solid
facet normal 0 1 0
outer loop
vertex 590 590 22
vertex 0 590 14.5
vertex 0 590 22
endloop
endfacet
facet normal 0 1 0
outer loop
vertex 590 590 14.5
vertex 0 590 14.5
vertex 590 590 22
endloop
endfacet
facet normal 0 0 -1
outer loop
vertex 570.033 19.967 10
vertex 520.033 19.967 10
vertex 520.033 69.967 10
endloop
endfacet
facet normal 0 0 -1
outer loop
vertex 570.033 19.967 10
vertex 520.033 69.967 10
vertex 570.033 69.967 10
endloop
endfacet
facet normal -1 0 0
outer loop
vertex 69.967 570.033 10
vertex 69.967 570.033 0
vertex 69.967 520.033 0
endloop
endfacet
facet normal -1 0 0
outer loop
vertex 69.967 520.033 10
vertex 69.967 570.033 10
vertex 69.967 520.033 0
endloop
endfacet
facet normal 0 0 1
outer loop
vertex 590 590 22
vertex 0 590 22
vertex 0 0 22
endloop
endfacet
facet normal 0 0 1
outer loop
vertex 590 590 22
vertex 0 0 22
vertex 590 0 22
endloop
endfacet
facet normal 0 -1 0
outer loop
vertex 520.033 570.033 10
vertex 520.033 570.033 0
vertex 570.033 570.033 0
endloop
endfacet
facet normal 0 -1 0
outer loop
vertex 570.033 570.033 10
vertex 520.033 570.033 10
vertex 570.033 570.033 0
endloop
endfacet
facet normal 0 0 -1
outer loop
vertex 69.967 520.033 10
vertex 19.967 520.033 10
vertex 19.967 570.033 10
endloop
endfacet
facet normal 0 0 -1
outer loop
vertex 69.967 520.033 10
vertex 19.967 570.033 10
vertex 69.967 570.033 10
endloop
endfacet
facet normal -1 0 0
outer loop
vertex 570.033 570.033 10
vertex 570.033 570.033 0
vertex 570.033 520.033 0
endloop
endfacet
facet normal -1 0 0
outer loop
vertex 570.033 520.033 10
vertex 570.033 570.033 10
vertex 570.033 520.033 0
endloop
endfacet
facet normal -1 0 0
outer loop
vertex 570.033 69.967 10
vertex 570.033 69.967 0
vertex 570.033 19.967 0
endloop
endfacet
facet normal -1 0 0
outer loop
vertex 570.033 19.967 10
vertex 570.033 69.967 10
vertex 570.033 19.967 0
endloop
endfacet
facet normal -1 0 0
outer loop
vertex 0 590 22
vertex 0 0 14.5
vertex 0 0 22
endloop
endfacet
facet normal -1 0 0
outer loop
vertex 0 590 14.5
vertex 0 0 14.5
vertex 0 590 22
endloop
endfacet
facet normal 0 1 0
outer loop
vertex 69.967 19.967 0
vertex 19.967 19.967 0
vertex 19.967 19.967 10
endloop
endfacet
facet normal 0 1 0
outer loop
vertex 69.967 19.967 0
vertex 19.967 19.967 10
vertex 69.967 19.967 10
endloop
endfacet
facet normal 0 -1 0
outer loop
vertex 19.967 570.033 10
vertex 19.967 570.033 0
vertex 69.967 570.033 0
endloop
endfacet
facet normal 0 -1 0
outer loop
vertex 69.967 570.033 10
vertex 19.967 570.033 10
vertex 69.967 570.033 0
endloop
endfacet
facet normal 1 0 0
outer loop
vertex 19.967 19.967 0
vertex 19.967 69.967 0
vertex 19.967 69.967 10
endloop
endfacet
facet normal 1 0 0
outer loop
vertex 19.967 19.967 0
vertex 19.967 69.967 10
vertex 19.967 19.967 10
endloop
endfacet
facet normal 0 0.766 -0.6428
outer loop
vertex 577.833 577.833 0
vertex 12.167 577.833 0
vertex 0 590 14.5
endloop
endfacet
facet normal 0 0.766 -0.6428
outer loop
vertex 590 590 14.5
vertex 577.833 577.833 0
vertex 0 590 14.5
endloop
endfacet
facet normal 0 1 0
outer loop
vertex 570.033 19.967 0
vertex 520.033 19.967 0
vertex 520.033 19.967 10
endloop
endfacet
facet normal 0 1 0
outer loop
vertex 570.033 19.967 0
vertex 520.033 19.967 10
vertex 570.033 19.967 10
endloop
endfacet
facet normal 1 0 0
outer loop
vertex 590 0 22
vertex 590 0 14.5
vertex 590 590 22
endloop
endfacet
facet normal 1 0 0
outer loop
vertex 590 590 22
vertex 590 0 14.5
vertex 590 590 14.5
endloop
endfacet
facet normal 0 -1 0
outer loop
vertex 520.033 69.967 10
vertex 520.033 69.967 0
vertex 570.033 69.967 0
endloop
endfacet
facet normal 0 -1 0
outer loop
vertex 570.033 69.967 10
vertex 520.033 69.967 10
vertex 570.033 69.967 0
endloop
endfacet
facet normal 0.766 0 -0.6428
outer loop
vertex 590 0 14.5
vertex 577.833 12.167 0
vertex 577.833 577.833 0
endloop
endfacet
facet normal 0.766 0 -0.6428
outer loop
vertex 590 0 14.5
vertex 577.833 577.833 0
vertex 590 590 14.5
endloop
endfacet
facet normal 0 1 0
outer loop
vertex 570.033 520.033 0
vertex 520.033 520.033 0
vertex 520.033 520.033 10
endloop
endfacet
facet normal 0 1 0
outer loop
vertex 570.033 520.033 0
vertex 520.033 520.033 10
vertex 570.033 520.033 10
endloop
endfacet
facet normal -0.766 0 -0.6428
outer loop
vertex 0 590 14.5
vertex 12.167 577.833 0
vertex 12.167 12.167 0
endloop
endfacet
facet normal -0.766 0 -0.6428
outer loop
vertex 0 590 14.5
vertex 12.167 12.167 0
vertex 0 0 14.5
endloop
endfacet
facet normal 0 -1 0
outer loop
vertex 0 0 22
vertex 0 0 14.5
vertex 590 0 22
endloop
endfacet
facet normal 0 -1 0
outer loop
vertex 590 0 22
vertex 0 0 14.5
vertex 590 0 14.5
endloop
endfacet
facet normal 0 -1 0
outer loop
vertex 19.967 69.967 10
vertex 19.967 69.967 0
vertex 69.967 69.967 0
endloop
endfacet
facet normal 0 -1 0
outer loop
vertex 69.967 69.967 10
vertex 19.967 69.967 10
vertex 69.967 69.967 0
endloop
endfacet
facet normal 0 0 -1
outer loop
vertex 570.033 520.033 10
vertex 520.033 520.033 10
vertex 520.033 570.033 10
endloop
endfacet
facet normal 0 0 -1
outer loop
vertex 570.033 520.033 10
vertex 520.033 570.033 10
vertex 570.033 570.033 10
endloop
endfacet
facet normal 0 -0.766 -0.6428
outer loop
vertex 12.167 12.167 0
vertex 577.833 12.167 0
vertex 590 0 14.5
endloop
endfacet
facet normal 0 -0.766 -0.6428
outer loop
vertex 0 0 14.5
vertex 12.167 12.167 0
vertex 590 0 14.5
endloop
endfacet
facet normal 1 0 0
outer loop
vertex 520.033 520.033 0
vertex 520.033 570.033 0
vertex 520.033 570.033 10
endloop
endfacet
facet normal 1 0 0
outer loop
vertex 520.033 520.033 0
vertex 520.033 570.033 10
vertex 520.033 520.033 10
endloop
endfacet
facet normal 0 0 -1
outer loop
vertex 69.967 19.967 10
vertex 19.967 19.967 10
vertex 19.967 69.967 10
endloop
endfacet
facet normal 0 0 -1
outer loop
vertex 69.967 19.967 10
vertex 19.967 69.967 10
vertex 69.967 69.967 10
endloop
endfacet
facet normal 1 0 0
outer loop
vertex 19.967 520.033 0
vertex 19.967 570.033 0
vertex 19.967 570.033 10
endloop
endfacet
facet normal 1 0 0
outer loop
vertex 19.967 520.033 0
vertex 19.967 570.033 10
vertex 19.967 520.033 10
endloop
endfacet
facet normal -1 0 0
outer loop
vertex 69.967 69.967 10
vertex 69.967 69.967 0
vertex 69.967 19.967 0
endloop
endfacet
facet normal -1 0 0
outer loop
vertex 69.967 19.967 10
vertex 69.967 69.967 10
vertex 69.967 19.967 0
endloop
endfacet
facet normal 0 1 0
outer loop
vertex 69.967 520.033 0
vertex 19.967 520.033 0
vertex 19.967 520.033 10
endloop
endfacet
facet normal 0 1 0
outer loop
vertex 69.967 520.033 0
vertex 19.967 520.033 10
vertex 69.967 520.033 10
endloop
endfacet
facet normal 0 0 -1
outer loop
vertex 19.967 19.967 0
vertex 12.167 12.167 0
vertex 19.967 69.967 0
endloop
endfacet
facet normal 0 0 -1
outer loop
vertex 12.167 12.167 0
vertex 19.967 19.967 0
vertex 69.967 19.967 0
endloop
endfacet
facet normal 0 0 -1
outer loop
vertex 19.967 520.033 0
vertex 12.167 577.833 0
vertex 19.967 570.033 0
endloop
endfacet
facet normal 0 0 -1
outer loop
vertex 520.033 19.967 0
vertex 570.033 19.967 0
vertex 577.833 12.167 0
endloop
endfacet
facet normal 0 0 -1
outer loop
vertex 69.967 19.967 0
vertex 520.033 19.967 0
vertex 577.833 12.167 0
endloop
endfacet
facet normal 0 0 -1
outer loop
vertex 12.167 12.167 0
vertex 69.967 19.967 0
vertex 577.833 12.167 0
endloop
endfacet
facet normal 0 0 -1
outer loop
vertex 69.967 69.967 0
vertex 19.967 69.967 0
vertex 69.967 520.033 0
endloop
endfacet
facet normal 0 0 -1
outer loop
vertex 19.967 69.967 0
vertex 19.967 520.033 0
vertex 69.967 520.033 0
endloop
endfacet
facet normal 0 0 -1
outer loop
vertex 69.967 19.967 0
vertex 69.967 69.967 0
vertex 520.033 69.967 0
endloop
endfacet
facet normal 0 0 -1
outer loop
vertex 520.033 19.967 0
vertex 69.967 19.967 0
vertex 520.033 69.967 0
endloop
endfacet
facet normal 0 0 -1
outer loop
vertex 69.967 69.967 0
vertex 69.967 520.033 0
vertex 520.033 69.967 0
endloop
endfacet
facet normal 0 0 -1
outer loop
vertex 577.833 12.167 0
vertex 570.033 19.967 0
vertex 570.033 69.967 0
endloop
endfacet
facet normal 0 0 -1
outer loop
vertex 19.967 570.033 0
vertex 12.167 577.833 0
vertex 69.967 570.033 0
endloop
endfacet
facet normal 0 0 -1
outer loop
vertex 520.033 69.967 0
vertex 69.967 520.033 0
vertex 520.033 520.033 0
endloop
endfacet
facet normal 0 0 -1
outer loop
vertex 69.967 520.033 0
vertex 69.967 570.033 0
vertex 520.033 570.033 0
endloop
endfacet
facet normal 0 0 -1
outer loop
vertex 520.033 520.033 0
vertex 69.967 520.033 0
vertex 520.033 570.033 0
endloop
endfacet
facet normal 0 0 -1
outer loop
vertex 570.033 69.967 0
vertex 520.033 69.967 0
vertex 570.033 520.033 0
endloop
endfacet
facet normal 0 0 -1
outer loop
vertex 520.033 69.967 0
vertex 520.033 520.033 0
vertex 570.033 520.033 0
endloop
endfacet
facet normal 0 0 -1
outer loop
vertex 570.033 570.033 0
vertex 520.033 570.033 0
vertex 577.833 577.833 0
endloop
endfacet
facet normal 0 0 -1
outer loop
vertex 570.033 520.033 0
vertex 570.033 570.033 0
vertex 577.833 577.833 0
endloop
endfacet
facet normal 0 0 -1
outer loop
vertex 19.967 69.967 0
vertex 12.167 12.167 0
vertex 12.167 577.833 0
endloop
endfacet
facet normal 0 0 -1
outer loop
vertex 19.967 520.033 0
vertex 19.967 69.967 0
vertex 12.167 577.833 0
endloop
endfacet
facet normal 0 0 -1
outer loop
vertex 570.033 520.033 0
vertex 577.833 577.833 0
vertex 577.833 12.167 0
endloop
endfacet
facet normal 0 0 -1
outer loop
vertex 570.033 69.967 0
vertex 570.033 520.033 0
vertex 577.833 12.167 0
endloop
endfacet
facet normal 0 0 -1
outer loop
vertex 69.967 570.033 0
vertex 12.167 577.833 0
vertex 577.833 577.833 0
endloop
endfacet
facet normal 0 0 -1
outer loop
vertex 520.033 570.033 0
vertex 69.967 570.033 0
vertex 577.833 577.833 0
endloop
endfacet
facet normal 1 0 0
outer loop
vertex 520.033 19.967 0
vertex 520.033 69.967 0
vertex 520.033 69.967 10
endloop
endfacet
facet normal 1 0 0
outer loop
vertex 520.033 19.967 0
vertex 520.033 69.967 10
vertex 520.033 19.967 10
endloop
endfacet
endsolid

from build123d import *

# Parameters (mm, degrees)
F0_W      = 590
F0_H      = 590
F1_DEPTH  = 22
F7_DEPTH  = 590.001
F8_DEPTH  = 590.001
F9_DEPTH  = 590.001
F10_DEPTH = 590.001
F11_W     = 50
F11_H     = 50
F12_DEPTH = 10


with BuildPart() as f1:
    # F0 (on Top) → F1 (new body)
    with BuildSketch(Plane.XY):
        with Locations((295, 295)):
            Rectangle(F0_W, F0_H)
    extrude(amount=F1_DEPTH)

    # F3 (on face) → F7 (cut, through all)
    with BuildSketch(Plane.XZ):
        Polygon((0, 14.5), (0, 0), (12.1669, 0), align=None)
    extrude(amount=-F7_DEPTH, mode=Mode.SUBTRACT)

    # F4 (on face) → F8 (cut, through all)
    with BuildSketch(Plane.YZ.offset(590)):
        Polygon((0, 14.5), (0, 0), (12.1669, 0), align=None)
    extrude(amount=-F8_DEPTH, mode=Mode.SUBTRACT)

    # F5 (on face) → F9 (cut, through all)
    with BuildSketch(Plane(origin=(0, 0, 0), x_dir=(0, -1, 0), z_dir=(-1, 0, 0))):
        Polygon((-590, 14.5), (-590, 0), (-577.8331, 0), align=None)
    extrude(amount=-F9_DEPTH, mode=Mode.SUBTRACT)

    # F6 (on face) → F10 (cut, through all)
    with BuildSketch(Plane(origin=(0, 590, 0), x_dir=(-1, 0, 0), z_dir=(0, 1, 0))):
        Polygon((-590, 14.5), (-590, 0), (-577.8331, 0), align=None)
    extrude(amount=-F10_DEPTH, mode=Mode.SUBTRACT)

    # F11 (on face) → F12 (cut)
    with BuildSketch(Plane(origin=(0, 0, 0), x_dir=(1, 0, 0), z_dir=(0, 0, -1))):
        with Locations((44.9669, -44.9669)):
            Rectangle(F11_W, F11_H)
        with Locations((545.0331, -44.9669)):
            Rectangle(F11_W, F11_H)
        with Locations((44.9669, -545.0331)):
            Rectangle(F11_W, F11_H)
        with Locations((545.0331, -545.0331)):
            Rectangle(F11_W, F11_H)
    extrude(amount=-F12_DEPTH, mode=Mode.SUBTRACT)


solid = f1.part
